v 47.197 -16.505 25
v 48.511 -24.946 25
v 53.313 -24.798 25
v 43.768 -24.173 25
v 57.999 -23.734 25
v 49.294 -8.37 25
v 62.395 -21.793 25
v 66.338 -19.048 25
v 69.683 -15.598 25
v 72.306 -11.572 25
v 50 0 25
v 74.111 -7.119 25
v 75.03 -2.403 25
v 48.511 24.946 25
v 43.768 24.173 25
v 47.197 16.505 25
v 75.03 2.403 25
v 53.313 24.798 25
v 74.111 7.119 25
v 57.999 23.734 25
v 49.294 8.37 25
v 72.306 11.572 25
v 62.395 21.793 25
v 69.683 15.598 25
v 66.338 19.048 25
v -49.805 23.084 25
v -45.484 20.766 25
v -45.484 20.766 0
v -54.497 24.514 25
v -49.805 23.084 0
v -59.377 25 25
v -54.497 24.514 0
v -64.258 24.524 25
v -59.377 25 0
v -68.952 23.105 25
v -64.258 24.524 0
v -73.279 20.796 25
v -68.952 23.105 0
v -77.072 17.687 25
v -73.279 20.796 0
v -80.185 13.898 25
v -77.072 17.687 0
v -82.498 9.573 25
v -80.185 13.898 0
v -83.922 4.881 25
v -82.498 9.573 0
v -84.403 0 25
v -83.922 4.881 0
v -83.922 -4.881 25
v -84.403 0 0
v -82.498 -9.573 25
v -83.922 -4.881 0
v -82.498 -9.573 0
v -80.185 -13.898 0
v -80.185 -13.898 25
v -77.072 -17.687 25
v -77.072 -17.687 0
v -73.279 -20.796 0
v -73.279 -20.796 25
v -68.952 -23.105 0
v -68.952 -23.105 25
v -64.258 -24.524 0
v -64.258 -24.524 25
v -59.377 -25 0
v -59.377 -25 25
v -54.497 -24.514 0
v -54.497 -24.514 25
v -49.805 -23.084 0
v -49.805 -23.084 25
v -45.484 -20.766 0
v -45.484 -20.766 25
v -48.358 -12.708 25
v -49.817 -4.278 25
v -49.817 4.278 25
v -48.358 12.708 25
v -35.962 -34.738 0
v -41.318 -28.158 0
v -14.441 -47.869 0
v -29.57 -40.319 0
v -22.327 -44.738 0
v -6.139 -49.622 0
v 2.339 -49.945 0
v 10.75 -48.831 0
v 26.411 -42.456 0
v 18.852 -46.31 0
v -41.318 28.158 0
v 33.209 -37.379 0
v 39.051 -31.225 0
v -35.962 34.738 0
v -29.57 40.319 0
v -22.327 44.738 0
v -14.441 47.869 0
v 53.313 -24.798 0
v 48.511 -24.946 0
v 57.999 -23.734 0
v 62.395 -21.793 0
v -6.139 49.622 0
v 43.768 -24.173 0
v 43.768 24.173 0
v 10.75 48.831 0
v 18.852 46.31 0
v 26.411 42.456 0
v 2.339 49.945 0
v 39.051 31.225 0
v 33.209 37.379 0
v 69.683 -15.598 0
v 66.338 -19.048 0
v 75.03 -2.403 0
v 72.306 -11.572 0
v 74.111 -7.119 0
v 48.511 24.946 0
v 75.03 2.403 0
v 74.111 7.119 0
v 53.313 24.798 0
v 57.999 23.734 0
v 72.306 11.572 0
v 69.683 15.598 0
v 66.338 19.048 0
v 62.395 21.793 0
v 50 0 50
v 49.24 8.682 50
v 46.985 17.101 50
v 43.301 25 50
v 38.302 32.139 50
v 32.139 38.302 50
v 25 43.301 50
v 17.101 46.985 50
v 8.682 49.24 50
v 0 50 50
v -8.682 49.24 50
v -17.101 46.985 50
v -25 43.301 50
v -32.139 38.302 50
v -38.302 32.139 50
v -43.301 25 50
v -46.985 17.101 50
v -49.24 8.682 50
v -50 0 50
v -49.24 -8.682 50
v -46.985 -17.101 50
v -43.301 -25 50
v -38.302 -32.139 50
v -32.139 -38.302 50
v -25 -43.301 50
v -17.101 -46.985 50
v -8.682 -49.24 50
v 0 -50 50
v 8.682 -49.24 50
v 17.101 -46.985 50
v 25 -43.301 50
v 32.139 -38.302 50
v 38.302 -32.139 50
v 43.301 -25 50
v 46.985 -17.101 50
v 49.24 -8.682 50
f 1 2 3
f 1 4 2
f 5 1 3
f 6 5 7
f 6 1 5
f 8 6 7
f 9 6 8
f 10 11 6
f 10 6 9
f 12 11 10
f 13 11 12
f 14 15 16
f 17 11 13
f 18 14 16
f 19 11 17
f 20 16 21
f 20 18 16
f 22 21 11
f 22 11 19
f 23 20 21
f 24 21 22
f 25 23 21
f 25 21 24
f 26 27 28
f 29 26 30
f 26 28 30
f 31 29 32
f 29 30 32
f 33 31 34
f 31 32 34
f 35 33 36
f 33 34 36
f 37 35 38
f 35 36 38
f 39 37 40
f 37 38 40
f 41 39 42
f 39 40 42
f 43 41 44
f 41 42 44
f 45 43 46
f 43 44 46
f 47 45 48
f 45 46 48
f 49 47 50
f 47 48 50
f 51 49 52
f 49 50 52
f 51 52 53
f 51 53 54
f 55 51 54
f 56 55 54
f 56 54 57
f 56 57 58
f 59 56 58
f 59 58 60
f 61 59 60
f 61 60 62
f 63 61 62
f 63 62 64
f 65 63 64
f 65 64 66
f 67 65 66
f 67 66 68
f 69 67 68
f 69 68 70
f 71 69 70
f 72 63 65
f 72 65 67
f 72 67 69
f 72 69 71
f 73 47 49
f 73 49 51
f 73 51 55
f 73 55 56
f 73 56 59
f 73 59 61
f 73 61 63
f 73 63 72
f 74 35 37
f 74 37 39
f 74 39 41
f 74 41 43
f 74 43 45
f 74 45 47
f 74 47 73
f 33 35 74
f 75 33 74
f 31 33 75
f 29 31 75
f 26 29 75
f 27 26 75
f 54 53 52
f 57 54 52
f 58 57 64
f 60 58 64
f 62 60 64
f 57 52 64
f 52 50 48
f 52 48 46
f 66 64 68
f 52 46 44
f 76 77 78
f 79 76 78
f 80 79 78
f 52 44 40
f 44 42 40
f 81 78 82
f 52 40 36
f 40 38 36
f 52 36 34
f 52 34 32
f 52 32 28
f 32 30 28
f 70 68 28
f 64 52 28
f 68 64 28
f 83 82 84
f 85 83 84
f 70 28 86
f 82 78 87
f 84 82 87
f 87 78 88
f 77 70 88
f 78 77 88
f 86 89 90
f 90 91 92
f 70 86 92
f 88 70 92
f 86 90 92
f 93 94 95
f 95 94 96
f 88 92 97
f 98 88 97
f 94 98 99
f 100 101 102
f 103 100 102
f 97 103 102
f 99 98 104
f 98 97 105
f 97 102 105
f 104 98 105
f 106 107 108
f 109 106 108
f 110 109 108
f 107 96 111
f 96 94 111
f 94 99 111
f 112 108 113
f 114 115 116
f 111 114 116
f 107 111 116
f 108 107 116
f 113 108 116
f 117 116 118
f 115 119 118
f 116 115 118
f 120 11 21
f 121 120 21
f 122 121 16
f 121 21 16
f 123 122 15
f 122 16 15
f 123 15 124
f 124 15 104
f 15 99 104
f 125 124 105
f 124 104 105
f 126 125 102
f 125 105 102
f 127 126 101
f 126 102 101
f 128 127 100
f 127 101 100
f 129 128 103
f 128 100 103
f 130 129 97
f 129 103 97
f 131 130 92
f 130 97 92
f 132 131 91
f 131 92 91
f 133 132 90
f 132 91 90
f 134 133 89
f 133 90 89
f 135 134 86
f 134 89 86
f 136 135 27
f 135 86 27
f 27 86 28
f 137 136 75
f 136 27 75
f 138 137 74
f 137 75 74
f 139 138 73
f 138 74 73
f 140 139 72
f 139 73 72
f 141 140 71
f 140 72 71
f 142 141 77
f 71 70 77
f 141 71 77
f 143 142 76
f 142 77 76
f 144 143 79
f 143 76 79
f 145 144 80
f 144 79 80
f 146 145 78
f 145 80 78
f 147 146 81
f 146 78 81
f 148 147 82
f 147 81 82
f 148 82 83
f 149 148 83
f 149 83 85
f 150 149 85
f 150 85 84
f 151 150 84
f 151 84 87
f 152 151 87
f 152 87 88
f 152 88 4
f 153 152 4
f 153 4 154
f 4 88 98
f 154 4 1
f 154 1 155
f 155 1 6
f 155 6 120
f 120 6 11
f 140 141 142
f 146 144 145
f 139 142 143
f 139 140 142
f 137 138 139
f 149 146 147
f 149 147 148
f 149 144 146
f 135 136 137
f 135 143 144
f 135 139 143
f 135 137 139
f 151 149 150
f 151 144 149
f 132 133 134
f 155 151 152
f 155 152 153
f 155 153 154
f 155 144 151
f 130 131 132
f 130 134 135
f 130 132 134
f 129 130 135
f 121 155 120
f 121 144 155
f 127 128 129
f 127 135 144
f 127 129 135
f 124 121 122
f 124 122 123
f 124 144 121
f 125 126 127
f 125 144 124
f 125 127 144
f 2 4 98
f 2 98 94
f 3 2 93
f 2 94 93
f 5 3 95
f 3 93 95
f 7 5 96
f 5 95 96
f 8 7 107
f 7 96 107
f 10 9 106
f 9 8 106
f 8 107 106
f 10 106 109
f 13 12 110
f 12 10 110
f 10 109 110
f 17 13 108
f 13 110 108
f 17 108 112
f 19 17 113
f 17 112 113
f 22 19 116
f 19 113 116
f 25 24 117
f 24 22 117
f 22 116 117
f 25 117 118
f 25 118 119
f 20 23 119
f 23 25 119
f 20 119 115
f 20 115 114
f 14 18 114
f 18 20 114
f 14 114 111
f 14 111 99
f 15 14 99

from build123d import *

# Parameters (mm, degrees)
F0_R     = 50
F1_DEPTH = 50
F2_R     = 25
F3_DEPTH = 25


with BuildPart() as f1:
    # F0 (on Top) → F1 (new body)
    with BuildSketch(Plane.XY):
        Circle(F0_R)
    extrude(amount=F1_DEPTH)

    # F2 (on Top) → F3 (join)
    with BuildSketch(Plane.XY):
        with Locations((50.145525, 0)):
            Circle(F2_R)
        with Locations((-59.403446, 0)):
            Circle(F2_R)
    extrude(amount=F3_DEPTH)


solid = f1.part
